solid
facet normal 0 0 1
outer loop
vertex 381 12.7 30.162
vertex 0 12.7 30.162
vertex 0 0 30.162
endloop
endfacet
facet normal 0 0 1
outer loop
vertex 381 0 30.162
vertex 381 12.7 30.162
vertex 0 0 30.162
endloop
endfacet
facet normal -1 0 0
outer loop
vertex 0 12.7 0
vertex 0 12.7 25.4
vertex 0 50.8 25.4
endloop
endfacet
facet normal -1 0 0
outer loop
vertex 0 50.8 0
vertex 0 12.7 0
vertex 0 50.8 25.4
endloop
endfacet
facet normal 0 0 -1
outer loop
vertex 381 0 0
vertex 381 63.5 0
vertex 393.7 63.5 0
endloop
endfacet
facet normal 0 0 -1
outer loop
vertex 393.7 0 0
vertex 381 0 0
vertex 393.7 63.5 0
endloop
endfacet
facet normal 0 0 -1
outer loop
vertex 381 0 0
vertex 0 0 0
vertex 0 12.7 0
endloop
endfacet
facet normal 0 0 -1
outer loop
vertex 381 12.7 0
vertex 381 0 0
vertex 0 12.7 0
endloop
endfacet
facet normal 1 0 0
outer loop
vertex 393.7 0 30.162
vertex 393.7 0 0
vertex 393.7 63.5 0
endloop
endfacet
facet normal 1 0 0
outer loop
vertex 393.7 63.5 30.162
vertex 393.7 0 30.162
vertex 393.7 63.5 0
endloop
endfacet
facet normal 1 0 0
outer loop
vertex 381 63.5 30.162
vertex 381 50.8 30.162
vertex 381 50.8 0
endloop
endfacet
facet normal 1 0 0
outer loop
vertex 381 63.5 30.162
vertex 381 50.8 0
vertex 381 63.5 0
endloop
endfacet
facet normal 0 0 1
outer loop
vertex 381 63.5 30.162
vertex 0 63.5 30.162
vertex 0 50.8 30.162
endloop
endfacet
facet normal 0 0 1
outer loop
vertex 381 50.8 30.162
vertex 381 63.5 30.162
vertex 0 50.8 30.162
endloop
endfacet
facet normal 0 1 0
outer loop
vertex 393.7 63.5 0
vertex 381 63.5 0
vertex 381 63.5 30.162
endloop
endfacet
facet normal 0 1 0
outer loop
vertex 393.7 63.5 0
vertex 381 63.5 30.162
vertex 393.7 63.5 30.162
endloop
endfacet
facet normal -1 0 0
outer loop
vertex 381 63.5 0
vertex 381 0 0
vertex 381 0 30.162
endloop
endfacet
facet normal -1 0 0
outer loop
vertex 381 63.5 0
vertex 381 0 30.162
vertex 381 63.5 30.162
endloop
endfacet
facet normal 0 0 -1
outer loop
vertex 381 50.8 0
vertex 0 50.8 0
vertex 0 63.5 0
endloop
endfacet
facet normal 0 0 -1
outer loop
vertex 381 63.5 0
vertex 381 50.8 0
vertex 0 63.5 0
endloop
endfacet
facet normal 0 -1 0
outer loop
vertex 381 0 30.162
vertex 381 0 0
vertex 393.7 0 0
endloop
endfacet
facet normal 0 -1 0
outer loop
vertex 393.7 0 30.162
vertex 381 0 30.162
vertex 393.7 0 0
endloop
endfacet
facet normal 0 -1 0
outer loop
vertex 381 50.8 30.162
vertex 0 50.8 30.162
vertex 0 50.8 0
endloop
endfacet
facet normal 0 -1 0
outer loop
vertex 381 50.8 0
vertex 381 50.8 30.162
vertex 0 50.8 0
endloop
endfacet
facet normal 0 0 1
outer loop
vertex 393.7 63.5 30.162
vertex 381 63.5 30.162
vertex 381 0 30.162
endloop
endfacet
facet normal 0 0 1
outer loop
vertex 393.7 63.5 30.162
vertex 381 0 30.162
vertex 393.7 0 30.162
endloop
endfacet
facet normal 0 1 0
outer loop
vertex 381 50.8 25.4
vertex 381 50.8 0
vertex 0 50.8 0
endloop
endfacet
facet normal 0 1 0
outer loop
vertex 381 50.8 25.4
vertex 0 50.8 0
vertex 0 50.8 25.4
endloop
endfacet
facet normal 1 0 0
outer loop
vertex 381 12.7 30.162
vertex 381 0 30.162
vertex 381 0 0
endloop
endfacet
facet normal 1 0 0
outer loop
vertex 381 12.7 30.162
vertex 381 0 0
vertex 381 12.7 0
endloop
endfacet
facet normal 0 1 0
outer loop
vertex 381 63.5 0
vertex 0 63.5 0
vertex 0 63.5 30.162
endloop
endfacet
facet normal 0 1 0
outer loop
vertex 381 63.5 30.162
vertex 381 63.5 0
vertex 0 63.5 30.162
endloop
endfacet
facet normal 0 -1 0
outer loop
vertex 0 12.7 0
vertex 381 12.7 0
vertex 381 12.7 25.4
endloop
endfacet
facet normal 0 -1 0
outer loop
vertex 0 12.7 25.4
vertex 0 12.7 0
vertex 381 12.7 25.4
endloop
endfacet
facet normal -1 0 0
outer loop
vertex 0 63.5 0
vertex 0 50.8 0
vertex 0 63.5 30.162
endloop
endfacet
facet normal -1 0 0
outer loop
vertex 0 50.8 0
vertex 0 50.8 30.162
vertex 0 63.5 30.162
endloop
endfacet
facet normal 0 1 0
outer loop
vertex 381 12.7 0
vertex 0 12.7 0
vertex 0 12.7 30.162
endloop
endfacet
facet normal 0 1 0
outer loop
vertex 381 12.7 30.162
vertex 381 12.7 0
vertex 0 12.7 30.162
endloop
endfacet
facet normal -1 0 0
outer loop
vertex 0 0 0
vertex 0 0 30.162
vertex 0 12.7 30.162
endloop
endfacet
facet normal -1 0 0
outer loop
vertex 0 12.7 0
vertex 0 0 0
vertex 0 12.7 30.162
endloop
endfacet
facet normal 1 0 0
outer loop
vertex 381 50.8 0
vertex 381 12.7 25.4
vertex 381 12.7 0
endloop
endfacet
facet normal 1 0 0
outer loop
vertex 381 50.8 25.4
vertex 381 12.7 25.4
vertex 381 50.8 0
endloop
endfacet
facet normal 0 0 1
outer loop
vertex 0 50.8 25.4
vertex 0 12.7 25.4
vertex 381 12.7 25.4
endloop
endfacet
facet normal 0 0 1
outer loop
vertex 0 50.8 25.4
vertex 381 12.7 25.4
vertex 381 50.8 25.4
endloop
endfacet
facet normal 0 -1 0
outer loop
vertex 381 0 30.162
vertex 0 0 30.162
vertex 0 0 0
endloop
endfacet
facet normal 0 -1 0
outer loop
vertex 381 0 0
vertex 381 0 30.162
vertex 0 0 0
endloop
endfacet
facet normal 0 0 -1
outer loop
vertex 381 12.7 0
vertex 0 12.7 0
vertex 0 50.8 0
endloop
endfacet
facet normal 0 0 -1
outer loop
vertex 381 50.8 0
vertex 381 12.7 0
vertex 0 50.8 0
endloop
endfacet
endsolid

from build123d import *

# Parameters (mm, degrees)
F1_DEPTH = 406.4
F0_W     = 38.1
F0_H     = 25.4
F2_DEPTH = 406.4
F3_W     = 25.4
F3_H     = 63.5
F4_DEPTH = 30.1635
F5_W     = 12.7
F5_H     = 63.5
F6_DEPTH = 30.1625


with BuildPart() as f1:
    # F0 (on Right) → F1 (new body)
    with BuildSketch(Plane.YZ):
        Polygon((0, 30.1625), (0, 0), (12.7, 0), (12.7, 25.4), (12.7, 30.1625), align=None)
        Polygon((50.8, 25.4), (50.8, 0), (63.5, 0), (63.5, 30.1625), (50.8, 30.1625), align=None)
    extrude(amount=F1_DEPTH)


with BuildPart() as f2:
    # F0 (on Right) → F2 (new body, through all)
    with BuildSketch(Plane.YZ):
        with Locations((31.75, 12.7)):
            Rectangle(F0_W, F0_H)
    extrude(amount=F2_DEPTH)


with BuildPart() as f4_tool:
    # F3 (on face) → F4 (new body, through all)
    with BuildSketch(Plane.XY.offset(30.1625)):
        with Locations((393.7, 31.75)):
            Rectangle(F3_W, F3_H)
    extrude(amount=-F4_DEPTH)


with BuildPart() as f1_1:
    add(f1.part)

    # F4: cut by f4_tool
    add(f4_tool.part, mode=Mode.SUBTRACT)


with BuildPart() as f2_1:
    add(f2.part)

    # F4: cut by f4_tool
    add(f4_tool.part, mode=Mode.SUBTRACT)


with BuildPart() as f6:
    # F5 (on Top) → F6 (new body, through all)
    with BuildSketch(Plane.XY):
        with Locations((387.35, 31.75)):
            Rectangle(F5_W, F5_H)
    extrude(amount=F6_DEPTH)


solid = Compound([f1_1.part, f2_1.part, f6.part])
